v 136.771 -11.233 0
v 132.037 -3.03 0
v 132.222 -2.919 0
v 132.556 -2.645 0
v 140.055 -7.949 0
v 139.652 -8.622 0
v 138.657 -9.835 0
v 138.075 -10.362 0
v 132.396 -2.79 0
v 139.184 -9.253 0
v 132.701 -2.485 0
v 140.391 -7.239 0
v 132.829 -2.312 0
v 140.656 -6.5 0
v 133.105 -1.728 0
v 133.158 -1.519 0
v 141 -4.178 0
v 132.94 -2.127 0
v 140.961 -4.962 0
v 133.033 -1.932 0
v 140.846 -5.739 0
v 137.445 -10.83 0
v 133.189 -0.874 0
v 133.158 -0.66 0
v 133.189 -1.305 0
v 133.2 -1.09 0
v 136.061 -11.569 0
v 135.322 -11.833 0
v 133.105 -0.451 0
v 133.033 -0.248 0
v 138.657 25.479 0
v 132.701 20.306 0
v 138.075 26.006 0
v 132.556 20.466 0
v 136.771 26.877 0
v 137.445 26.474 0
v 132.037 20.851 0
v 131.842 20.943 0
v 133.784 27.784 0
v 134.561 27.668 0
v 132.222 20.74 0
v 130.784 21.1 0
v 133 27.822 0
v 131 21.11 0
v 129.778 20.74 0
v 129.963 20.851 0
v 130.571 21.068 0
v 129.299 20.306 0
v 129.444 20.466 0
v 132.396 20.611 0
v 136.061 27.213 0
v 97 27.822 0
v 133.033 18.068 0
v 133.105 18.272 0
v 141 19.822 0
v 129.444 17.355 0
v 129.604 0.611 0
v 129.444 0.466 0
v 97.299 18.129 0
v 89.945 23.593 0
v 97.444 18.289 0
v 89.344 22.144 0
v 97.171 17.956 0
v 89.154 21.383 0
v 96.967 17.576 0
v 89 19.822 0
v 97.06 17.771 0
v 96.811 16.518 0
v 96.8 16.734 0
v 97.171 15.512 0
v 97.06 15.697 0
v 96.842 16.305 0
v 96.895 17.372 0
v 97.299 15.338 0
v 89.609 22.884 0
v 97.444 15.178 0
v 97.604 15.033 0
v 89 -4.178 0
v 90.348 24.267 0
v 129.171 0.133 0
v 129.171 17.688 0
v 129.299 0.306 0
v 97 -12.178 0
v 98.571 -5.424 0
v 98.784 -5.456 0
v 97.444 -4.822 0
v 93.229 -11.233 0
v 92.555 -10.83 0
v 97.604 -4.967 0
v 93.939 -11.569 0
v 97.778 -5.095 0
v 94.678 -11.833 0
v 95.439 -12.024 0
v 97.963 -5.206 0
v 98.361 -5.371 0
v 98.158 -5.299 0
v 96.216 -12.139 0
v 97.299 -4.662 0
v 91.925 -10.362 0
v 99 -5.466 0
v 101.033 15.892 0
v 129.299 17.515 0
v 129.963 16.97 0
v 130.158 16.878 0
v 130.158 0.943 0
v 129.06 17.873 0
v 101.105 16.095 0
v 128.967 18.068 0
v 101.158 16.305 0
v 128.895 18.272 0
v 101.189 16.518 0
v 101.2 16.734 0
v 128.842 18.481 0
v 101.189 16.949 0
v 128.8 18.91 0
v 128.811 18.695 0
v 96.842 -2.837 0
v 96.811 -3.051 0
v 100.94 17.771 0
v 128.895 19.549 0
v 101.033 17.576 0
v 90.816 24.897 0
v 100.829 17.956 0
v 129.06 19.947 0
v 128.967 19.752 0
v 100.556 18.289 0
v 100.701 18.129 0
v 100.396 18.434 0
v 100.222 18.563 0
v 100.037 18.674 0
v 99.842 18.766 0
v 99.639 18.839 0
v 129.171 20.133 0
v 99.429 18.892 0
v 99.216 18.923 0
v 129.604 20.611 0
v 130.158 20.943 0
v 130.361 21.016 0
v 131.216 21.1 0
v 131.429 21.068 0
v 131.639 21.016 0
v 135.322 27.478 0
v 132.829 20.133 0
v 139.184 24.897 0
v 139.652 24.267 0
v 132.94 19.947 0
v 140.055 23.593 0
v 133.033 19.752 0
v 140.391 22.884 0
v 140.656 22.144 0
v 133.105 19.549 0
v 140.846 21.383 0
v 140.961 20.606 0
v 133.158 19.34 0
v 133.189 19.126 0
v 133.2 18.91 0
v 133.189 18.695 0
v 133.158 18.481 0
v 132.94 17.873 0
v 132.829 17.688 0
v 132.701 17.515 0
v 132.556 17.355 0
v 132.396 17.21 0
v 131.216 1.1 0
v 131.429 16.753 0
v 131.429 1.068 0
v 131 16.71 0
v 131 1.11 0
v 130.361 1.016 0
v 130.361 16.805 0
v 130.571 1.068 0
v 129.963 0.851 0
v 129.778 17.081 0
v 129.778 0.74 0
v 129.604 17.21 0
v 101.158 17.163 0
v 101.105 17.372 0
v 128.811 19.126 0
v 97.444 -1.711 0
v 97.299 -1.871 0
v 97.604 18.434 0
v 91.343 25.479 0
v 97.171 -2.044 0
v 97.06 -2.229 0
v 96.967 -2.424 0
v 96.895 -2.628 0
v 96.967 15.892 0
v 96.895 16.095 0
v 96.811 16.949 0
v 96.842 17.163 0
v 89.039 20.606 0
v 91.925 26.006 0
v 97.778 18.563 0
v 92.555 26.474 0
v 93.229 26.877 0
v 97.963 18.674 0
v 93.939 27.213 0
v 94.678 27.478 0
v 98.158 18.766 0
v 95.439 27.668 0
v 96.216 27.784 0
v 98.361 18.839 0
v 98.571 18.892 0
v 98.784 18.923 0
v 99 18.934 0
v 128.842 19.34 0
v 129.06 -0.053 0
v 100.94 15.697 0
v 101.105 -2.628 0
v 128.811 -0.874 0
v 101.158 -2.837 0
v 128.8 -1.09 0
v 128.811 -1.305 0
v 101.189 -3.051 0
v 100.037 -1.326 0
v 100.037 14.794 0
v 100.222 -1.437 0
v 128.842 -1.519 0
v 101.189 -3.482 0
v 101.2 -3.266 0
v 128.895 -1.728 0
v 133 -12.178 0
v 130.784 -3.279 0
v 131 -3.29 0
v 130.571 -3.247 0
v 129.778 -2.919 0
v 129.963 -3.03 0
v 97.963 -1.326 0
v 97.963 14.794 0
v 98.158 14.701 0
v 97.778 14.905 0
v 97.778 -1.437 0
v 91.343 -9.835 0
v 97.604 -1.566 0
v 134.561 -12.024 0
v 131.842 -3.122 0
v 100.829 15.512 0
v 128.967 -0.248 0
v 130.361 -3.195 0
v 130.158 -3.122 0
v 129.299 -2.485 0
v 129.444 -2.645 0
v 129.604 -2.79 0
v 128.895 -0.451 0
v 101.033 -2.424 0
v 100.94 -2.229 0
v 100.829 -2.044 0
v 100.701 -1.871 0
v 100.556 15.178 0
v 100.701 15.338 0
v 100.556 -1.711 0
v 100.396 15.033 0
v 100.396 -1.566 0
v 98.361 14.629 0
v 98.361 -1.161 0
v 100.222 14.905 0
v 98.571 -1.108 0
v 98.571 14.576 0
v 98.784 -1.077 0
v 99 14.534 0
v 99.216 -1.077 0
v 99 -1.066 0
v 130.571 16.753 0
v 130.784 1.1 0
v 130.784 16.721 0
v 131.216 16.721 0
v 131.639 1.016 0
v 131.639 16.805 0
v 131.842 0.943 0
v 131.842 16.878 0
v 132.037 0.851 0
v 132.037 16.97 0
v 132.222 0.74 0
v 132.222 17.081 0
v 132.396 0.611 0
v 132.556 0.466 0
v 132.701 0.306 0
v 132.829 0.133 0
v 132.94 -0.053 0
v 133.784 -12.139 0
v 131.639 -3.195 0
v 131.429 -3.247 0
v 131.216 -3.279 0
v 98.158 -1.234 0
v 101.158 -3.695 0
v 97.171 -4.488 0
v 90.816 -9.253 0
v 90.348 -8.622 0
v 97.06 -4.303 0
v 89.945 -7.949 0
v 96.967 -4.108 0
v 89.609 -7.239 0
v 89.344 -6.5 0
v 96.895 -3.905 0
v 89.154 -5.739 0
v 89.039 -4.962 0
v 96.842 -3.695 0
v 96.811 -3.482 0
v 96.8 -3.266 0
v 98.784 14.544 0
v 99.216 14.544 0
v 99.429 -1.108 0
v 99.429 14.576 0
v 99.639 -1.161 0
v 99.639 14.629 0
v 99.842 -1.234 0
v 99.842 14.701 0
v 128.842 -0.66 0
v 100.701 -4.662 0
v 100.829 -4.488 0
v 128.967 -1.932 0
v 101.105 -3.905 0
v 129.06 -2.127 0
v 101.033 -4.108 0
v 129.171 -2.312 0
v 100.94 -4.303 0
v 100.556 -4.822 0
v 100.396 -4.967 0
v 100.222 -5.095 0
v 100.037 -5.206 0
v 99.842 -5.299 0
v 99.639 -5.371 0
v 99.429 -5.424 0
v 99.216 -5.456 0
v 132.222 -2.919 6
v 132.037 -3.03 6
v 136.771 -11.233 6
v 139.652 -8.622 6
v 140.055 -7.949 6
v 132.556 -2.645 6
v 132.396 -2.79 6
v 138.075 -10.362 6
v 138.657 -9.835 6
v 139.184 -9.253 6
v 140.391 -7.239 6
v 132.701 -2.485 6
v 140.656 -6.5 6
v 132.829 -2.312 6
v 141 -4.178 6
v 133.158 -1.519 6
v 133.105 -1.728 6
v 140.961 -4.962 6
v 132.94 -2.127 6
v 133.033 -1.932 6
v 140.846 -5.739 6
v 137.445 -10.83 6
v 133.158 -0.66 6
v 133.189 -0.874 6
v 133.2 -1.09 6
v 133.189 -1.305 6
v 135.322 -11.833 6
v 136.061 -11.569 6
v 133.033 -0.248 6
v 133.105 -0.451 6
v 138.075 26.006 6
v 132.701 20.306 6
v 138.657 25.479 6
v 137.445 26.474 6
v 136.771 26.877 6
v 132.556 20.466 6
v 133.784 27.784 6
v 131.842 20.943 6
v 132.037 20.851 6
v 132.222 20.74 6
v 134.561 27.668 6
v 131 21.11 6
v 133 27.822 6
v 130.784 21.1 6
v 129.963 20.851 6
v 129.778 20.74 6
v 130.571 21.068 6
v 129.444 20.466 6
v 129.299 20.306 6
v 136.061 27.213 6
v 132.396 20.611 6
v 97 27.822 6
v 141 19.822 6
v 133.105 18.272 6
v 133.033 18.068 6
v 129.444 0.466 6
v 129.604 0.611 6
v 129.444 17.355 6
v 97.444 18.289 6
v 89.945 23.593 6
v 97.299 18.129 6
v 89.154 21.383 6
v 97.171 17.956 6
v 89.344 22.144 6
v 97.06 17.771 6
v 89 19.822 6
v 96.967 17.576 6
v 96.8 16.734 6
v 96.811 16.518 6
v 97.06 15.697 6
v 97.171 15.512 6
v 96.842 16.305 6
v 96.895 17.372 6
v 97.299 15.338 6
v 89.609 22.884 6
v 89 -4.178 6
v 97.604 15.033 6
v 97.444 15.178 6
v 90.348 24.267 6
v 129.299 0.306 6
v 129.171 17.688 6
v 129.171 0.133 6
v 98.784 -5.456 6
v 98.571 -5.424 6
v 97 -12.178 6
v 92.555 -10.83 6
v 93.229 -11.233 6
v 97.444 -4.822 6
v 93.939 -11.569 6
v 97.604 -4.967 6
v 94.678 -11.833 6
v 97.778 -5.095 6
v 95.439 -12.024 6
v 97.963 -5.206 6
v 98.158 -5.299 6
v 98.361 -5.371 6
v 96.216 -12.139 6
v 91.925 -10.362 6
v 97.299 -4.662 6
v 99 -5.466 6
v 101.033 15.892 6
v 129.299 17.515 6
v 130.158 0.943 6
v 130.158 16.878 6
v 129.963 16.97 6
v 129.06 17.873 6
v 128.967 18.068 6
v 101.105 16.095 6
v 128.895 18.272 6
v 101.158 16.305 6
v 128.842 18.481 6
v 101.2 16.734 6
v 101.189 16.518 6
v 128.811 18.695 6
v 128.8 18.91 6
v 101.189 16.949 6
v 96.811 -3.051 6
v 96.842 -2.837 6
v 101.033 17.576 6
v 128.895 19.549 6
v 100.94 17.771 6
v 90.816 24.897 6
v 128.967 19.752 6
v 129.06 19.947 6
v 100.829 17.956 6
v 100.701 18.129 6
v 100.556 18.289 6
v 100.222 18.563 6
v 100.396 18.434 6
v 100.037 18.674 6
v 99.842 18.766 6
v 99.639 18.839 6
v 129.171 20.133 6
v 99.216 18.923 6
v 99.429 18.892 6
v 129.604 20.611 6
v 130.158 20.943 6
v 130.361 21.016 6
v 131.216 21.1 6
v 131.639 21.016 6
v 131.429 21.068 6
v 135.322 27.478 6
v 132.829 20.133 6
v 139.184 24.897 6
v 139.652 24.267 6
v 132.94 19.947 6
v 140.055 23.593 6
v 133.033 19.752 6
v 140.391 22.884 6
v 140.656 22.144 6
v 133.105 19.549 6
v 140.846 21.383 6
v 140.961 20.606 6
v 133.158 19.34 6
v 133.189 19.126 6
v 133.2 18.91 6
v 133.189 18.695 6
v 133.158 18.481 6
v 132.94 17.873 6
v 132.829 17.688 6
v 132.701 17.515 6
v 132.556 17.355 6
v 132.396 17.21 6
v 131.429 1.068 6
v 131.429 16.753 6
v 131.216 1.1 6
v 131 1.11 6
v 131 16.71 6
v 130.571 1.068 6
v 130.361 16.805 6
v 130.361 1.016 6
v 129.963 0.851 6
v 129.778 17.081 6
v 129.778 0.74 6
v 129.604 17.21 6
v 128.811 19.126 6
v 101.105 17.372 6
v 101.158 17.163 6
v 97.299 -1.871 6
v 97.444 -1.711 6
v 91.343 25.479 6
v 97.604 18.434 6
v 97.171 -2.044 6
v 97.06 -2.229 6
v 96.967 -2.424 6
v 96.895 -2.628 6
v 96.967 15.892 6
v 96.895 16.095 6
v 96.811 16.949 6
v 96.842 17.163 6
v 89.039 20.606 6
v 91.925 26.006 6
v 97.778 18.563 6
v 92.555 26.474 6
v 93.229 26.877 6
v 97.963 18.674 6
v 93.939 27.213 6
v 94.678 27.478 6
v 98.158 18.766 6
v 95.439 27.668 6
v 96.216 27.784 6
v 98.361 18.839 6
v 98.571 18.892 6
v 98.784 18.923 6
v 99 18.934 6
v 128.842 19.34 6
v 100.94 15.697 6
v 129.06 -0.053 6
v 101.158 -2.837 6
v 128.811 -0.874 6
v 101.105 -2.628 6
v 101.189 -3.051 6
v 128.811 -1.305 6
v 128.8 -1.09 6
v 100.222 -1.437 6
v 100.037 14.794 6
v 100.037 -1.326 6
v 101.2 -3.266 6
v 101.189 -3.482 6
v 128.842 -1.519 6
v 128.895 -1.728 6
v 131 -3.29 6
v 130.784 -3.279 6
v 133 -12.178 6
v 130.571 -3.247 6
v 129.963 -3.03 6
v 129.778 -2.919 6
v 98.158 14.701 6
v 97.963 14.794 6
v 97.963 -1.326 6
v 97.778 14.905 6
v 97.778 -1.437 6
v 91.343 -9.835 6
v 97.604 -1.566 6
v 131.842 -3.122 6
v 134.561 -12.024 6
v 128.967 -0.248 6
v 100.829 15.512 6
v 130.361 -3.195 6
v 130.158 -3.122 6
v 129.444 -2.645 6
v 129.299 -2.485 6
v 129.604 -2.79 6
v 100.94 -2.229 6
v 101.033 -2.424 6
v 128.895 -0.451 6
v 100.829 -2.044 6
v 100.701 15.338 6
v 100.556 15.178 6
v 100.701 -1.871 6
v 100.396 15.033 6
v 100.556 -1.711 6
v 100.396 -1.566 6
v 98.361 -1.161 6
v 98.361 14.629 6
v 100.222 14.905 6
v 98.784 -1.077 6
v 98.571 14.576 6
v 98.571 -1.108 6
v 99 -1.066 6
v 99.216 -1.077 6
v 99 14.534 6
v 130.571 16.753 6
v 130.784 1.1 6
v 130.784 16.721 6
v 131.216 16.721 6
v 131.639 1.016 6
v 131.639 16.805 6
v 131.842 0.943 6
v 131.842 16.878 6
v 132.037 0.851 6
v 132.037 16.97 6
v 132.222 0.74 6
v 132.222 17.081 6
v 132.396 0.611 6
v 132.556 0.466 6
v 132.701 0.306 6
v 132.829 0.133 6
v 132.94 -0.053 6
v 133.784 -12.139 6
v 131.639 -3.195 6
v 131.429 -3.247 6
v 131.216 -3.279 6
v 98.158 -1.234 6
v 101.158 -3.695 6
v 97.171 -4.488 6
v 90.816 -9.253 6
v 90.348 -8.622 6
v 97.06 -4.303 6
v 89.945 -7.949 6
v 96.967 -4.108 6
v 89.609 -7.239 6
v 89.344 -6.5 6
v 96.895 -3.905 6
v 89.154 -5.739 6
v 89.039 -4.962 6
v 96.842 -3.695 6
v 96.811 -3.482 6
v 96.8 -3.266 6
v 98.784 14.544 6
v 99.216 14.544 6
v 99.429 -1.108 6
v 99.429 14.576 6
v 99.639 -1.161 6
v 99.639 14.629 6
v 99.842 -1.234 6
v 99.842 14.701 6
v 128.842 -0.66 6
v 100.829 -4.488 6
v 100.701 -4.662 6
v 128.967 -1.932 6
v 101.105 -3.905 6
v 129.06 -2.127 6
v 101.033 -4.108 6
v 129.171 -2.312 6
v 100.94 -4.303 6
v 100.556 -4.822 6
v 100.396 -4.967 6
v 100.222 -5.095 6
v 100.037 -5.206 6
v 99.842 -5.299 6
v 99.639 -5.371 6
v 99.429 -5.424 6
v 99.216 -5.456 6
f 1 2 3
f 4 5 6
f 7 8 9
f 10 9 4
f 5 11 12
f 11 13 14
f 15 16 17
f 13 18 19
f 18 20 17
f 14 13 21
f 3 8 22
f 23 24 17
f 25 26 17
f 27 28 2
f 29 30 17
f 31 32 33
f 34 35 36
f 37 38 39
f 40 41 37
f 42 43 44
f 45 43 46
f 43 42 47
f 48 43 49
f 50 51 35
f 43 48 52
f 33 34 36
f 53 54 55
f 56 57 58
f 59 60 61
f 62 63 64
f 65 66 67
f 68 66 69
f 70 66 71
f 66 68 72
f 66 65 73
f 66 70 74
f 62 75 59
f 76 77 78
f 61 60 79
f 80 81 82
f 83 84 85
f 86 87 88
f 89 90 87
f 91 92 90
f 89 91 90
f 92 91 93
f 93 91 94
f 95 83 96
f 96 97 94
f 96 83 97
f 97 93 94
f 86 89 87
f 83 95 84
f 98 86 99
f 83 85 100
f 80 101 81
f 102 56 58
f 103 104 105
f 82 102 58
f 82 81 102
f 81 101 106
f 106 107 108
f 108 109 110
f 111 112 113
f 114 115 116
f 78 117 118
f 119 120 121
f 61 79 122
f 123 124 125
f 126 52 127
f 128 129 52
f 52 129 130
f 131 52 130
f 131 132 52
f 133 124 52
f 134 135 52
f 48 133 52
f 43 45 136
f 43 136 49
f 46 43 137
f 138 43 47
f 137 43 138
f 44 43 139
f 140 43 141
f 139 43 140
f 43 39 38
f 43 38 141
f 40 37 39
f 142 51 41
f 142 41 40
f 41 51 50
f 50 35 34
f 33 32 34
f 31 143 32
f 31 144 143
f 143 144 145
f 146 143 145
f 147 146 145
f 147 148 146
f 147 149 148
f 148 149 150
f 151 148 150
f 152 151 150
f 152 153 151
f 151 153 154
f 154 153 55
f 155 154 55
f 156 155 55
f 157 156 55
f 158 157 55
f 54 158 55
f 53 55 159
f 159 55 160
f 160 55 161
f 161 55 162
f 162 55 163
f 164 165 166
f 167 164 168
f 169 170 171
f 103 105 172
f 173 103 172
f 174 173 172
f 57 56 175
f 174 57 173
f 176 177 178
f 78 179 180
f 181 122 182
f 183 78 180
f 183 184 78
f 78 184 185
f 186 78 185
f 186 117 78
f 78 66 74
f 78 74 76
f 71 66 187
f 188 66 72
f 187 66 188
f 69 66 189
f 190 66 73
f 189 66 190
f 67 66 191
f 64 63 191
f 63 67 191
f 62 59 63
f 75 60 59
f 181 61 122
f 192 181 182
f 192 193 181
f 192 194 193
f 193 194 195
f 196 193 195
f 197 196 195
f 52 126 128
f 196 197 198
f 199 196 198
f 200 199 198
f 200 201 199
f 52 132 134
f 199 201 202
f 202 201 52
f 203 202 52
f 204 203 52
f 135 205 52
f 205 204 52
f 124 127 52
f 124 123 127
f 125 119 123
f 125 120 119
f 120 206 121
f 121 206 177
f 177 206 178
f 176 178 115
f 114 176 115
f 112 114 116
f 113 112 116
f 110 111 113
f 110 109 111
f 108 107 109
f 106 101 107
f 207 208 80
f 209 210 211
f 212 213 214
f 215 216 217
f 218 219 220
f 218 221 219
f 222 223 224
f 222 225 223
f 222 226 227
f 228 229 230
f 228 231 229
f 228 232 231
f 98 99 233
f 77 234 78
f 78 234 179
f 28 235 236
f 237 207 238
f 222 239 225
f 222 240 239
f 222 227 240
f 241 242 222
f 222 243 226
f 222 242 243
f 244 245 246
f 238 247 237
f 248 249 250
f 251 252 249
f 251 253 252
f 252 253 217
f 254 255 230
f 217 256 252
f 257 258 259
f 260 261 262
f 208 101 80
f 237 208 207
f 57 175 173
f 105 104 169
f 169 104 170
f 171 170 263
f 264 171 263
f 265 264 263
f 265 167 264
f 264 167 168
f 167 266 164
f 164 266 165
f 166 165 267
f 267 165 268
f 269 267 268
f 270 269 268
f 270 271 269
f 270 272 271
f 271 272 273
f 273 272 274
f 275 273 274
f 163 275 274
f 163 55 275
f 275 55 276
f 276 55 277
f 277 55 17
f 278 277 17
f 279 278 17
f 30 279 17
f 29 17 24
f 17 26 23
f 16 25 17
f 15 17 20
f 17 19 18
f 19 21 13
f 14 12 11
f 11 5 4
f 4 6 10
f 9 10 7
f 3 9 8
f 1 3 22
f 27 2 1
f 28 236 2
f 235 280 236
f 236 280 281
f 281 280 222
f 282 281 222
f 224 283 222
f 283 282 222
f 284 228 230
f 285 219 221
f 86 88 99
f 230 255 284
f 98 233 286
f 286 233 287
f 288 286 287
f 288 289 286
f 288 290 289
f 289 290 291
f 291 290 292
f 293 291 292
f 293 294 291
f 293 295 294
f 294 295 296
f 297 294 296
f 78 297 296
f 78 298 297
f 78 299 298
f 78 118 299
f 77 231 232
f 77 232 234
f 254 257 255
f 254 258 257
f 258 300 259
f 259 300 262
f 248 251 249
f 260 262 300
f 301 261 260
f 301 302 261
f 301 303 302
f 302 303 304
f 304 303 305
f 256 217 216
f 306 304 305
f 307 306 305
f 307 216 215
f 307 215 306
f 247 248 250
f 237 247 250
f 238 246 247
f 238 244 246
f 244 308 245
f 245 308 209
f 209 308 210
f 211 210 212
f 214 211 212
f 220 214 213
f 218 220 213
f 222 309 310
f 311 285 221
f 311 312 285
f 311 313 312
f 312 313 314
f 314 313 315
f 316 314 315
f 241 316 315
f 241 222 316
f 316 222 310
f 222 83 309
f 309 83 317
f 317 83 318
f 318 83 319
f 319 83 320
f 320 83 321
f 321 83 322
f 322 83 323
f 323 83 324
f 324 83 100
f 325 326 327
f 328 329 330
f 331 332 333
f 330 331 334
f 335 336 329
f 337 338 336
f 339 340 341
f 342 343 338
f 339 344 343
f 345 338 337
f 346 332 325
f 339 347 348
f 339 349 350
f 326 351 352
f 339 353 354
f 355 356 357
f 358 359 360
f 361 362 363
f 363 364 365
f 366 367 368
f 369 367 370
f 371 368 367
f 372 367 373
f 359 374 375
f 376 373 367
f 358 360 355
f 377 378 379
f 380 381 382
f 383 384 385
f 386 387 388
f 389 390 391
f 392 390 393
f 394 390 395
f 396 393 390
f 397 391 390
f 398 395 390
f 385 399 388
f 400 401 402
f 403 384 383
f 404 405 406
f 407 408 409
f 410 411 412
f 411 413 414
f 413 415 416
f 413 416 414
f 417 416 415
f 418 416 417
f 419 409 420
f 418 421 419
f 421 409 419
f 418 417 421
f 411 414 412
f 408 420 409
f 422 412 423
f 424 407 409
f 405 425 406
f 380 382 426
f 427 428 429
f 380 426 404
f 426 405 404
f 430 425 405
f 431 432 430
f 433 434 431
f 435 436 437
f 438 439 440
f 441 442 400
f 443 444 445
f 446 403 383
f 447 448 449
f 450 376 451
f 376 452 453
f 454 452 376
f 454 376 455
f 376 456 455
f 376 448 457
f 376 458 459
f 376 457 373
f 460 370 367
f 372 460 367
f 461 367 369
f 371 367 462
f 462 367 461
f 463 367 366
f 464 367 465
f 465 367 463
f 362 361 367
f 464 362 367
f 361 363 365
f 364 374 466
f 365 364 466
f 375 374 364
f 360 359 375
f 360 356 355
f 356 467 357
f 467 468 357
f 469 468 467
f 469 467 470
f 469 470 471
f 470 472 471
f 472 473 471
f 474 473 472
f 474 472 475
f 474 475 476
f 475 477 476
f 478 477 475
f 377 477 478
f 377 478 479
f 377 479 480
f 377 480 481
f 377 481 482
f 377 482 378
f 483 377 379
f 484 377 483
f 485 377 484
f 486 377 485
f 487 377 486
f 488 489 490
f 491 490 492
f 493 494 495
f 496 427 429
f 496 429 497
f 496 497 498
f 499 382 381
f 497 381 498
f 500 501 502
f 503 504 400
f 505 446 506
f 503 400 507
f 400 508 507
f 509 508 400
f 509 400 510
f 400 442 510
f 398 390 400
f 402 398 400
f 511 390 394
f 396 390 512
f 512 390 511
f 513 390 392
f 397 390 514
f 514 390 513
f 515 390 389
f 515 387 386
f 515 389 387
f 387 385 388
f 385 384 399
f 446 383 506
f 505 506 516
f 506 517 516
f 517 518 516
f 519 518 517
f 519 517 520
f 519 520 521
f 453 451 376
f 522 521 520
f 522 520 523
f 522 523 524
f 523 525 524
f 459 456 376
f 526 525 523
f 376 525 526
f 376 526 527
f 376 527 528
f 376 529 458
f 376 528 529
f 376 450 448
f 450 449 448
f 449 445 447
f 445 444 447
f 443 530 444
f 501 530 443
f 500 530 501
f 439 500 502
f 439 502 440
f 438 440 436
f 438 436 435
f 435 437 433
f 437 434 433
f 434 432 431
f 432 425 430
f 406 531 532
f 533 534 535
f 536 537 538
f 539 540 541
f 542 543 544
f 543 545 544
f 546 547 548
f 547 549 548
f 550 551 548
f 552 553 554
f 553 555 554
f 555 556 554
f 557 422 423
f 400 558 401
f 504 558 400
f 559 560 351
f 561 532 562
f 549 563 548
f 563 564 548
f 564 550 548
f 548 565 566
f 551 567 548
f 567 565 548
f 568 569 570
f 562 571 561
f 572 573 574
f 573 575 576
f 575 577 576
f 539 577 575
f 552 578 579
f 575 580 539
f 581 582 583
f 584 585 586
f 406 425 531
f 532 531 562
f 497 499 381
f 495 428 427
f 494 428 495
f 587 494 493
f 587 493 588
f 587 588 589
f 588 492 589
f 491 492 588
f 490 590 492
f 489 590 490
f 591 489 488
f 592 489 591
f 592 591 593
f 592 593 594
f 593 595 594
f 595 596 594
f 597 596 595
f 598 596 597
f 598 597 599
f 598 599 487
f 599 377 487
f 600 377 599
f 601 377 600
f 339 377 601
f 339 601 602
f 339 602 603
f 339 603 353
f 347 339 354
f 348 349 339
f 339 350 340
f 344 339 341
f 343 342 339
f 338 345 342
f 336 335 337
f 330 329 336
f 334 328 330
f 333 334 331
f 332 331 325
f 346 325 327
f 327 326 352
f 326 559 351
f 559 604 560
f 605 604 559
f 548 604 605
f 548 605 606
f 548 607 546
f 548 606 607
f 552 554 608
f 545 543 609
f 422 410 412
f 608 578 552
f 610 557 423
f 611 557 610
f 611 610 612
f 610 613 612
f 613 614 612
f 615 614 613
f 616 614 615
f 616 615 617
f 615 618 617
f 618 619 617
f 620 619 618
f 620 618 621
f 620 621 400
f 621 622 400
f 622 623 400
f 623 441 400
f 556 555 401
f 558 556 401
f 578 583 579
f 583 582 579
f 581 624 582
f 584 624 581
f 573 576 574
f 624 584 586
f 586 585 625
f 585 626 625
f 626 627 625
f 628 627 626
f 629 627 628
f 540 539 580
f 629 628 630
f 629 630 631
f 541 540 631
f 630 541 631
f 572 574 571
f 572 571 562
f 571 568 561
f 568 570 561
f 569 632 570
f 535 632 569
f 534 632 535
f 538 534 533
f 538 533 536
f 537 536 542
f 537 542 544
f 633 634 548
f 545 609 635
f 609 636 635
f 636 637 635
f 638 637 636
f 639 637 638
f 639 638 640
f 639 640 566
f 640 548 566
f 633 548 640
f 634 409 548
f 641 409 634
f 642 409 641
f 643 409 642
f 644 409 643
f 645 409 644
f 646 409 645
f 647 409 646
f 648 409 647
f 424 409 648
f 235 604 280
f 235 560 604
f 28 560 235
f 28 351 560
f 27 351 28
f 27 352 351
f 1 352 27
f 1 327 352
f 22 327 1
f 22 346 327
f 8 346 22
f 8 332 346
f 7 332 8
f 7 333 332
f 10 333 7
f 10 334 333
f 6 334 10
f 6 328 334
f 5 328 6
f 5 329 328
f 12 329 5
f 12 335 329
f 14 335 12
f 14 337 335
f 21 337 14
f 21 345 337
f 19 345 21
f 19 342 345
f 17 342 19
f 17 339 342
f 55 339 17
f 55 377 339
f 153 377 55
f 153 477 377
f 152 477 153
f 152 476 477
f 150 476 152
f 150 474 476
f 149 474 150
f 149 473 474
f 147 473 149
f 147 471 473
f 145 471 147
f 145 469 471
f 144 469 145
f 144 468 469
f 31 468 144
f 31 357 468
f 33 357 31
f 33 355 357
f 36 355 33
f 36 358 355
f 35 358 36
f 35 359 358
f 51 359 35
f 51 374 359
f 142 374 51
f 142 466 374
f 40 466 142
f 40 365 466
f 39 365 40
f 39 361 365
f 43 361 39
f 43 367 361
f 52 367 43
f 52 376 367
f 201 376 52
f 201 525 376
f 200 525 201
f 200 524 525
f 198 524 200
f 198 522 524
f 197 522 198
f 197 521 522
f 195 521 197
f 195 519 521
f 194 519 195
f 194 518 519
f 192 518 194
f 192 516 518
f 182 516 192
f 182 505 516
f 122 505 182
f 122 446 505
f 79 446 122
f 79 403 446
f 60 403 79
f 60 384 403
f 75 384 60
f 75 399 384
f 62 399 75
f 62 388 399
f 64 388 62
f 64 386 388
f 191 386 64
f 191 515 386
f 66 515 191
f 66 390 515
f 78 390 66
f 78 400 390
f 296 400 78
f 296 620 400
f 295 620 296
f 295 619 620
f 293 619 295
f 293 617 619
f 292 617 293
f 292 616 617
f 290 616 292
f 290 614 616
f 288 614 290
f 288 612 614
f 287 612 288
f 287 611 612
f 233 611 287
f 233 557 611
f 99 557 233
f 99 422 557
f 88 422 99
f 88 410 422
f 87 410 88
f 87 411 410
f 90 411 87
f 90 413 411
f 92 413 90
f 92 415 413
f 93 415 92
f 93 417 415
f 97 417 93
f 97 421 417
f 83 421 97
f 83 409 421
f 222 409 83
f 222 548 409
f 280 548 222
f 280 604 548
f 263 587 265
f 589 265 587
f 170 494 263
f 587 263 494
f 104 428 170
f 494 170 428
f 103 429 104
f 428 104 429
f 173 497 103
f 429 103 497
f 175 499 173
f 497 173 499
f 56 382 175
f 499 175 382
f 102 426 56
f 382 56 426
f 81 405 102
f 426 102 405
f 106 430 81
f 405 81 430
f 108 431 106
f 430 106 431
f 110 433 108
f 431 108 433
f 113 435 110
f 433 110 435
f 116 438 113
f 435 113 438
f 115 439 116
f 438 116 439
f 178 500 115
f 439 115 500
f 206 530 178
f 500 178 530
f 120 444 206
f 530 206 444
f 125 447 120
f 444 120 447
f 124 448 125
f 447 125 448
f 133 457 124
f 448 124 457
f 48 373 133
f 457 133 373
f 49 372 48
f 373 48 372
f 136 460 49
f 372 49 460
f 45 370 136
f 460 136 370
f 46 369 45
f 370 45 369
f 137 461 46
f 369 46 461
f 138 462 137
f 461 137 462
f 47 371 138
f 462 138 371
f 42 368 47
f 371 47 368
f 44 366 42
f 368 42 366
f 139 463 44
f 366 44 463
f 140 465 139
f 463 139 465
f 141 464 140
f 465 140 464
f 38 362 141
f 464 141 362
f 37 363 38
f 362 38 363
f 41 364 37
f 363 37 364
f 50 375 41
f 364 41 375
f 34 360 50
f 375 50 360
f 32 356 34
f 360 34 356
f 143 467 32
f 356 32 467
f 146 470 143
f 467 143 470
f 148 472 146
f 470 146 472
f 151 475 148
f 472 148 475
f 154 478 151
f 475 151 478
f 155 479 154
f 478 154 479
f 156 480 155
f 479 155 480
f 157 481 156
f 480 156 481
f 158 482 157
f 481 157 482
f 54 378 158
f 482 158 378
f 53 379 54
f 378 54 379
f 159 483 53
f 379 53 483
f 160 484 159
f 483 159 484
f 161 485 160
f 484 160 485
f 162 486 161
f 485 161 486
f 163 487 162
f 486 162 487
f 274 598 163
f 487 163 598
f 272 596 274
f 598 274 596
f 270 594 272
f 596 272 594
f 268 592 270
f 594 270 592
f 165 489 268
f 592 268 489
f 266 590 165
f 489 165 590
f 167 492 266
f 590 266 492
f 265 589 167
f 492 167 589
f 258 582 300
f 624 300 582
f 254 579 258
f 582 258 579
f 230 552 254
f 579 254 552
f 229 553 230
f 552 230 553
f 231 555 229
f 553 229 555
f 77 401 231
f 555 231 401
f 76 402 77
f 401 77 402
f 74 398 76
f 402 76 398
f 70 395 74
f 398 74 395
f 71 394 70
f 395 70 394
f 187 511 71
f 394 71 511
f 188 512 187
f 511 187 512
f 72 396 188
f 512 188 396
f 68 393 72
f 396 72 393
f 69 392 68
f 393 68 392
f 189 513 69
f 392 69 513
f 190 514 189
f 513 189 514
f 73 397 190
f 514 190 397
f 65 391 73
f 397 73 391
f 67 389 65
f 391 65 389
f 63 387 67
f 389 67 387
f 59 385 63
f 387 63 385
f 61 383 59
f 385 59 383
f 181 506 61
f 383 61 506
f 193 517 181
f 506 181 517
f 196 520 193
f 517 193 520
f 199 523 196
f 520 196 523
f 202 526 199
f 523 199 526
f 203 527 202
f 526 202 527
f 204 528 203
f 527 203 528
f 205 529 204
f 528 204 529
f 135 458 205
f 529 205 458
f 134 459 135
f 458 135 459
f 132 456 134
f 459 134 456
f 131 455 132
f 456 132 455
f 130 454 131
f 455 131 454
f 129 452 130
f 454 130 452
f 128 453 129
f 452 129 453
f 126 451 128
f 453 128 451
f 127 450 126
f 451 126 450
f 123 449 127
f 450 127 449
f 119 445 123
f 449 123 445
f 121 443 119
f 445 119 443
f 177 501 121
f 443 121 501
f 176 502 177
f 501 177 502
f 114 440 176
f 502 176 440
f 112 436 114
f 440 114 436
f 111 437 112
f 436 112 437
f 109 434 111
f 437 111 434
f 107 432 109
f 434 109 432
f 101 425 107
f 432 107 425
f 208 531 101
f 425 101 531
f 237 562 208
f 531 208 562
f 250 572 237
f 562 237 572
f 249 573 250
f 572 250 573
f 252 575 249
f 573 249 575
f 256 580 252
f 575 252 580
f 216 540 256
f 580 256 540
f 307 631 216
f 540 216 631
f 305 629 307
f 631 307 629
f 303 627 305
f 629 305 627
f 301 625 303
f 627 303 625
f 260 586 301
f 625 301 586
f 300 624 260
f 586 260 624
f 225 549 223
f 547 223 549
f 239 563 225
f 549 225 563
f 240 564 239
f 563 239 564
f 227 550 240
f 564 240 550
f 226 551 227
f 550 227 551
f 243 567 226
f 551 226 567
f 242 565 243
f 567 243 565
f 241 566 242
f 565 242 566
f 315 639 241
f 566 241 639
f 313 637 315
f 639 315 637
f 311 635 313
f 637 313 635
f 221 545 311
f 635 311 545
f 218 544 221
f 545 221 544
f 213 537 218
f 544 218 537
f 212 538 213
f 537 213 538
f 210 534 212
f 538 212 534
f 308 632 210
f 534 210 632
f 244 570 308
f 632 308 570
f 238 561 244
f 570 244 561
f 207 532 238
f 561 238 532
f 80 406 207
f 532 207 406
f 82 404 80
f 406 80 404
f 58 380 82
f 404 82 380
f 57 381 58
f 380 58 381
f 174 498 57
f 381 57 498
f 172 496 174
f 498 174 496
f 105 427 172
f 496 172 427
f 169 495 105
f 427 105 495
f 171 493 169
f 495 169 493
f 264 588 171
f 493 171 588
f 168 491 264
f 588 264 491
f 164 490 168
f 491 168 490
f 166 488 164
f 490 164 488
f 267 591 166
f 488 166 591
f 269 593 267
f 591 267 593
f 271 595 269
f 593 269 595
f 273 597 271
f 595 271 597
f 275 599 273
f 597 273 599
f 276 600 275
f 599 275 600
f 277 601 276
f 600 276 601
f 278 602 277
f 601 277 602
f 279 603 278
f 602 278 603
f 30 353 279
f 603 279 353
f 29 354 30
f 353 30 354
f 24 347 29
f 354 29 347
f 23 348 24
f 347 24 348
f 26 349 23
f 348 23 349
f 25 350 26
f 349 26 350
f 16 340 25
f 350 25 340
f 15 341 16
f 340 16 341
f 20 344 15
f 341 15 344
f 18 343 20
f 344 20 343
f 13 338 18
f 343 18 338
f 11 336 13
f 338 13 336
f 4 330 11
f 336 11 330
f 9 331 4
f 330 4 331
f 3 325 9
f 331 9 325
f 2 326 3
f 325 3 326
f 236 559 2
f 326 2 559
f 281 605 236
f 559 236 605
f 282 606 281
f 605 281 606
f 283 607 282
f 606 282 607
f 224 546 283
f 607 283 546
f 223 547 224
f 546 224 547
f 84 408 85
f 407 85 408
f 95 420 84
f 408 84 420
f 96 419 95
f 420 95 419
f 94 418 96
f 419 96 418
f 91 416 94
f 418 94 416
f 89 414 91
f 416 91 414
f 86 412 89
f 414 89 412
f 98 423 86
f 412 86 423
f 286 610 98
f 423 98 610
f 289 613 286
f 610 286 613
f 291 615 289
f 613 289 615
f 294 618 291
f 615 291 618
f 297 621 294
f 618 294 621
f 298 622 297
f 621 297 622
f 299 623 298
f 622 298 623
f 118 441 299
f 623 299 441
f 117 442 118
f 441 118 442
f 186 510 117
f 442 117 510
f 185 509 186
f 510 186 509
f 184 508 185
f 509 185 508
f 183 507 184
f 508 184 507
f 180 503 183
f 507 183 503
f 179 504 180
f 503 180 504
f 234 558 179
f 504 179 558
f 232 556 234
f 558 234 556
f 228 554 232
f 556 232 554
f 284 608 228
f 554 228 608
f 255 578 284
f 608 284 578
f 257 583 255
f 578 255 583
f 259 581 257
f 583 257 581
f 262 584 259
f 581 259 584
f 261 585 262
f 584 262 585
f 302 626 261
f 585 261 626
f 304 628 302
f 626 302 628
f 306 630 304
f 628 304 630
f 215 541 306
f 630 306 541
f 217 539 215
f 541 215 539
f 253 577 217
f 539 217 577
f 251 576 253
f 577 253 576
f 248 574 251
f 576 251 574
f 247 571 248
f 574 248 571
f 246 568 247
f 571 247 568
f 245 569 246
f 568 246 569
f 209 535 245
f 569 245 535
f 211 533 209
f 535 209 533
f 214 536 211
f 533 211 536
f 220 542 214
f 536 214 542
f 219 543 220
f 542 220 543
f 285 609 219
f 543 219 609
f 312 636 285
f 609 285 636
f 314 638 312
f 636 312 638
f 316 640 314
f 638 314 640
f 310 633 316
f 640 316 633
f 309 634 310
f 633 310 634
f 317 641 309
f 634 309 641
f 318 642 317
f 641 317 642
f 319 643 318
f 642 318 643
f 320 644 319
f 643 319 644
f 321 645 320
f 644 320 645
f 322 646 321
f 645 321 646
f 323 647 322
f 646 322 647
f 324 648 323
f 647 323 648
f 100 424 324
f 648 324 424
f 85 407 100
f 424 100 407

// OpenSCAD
// file: ../lib/vitamins.scad
// 구매품 목업 (vitamins) — 조립 간섭 확인용 (출력 부품 아님)
// 모든 모듈은 % 배경 처리로 호출부에서 사용 시 STL export에서 제외된다.
// 좌표 규약: 액추에이터는 기어박스 플랜지면 z=0, 출력축 +Z, 몸체 −Z.
include <../config/parameters.scad>

// SF24 스테퍼 모터 (42각). len = 몸체 길이, 플랜지면 z=0, 몸체 −Z
module motor_sf24(len) {
    translate([0, 0, -len])
        linear_extrude(len)
            offset(r = 3) square(motor_frame - 6, center = true);
}

// MG17 유성 기어박스. len = 몸체 길이, 출력 플랜지면 z=0, 출력축 +Z, 몸체 −Z
module gearbox_mg17(len) {
    union() {
        translate([0, 0, -len]) cylinder(d = gbx_frame, h = len);
        cylinder(d = gbx_out_shaft_d, h = gbx_out_shaft_len);
        cylinder(d = nema17_pilot_d, h = 2); // 출력측 파일럿 보스
    }
}

// 모터+기어박스 스택. 출력 플랜지면 z=0, 출력축 +Z
module actuator(motor_len, gbx_len) {
    union() {
        gearbox_mg17(gbx_len);
        translate([0, 0, -gbx_len]) motor_sf24(motor_len);
    }
}

// 관절별 액추에이터 프리셋
module actuator_J1() { actuator(motor_len_SF2424, gbx_len_20to1); }
module actuator_J2() { actuator(motor_len_SF2424, gbx_len_20to1); }
module actuator_J3() { actuator(motor_len_SF2423, gbx_len_20to1); }
module actuator_J4() { actuator(motor_len_SF2422, gbx_len_5to1); }

// 베어링 (zz 실드 단순 링)
module bearing(brg) {
    difference() {
        cylinder(d = brg[1], h = brg[2]);
        translate([0, 0, -0.1]) cylinder(d = brg[0], h = brg[2] + 0.2);
    }
}

// 스트리퍼(숄더) 볼트 — **피벗 샤프트 역할** (CON-001):
// SHCS형 머리 + 연삭 숄더(⌀d × l, 베어링 내경 활주면) + 감경 나사부
module shoulder_bolt(d, l) {
    union() {
        cylinder(d = d, h = l);                              // 숄더 (샤프트면)
        translate([0, 0, -d]) cylinder(d = d * 1.6, h = d);  // 머리
        translate([0, 0, l]) cylinder(d = d * 0.72, h = d);  // 나사부 (M(d-2)급)
    }
}

// 머신 볼트 (SHCS) — **고정 체결 전용** (샤프트 역할 아님)
module machine_bolt(d, l) {
    union() {
        translate([0, 0, -d]) cylinder(d = d * 1.7, h = d);  // 캡 머리
        cylinder(d = d, h = l);                              // 전산 생크
    }
}

// 육각 스탠드오프 (hex standoff, 암-암) — 플레이트 간격 결정 구조재
module hex_standoff(af, l) {
    difference() {
        cylinder(d = af / cos(30), h = l, $fn = 6);
        translate([0, 0, -0.1]) cylinder(d = af * 0.45, h = l + 0.2);
    }
}

// 나일론 락 너트 (nylock) — 회전 관절 축단 풀림 방지 (일반 너트와 구분)
module lock_nut(af, t, bore) {
    difference() {
        union() {
            cylinder(d = af / cos(30), h = t, $fn = 6);
            translate([0, 0, t - 0.1]) cylinder(d = af * 0.92, h = t * 0.5);
        }
        translate([0, 0, -0.1]) cylinder(d = bore, h = 2 * t);
    }
}

// 평와셔 (washer) — CON-001: 피벗은 숄더 볼트 + 와셔
module washer(d_in, t = 1.2) {
    difference() {
        cylinder(d = d_in * 2.2, h = t);
        translate([0, 0, -0.1]) cylinder(d = d_in + 0.3, h = t + 0.2);
    }
}

// 육각 너트 — af = 평면폭(across flats), 보어 = 호칭경
module hex_nut(af, t, bore) {
    difference() {
        cylinder(d = af / cos(30), h = t, $fn = 6);
        translate([0, 0, -0.1]) cylinder(d = bore, h = t + 0.2);
    }
}

// 기계식 마이크로 리미트 스위치 (KW12형) — 몸체만, 레버 생략
module limit_switch() {
    translate([-ls_body[0] / 2, -ls_body[2] / 2, 0])
        cube([ls_body[0], ls_body[2], ls_body[1]]);
}
// file: ../lib/utils.scad
// 공통 모듈 (common modules) — 베어링 시트, 볼트 홀 등
include <../config/parameters.scad>

// 베어링 시트 (bearing seat): 압입 공차 적용 포켓
// brg = [내경, 외경, 폭] (예: BRG_608ZZ)
module bearing_seat(brg) {
    cylinder(d = brg[1] + bearing_press_fit, h = brg[2]);
}

// 베어링 시트 + 내륜 도피 홀 (관통)
// wall = 시트 아래 받침 두께
module bearing_pocket(brg, wall = 2) {
    union() {
        translate([0, 0, wall]) bearing_seat(brg);
        // 내륜 접촉 방지: 내경보다 크고 외경보다 작은 도피 홀
        cylinder(d = (brg[0] + brg[1]) / 2, h = wall + 0.1);
    }
}

// 관통 볼트 홀 (clearance hole)
module bolt_hole(d, h) {
    cylinder(d = d + bolt_hole_oversize, h = h);
}

// NEMA 17 모터 마운트 홀 패턴 (CON-004: SF24 = 42각 NEMA 17 호환)
// h = 판 두께
module nema17_mount(h) {
    union() {
        cylinder(d = nema17_pilot_d + clearance_fit, h = h);
        for (x = [-1, 1], y = [-1, 1])
            translate([x * nema17_hole_pitch / 2, y * nema17_hole_pitch / 2, 0])
                bolt_hole(nema17_bolt_d, h);
    }
}

// 숄더 볼트 피벗 홀 (CON-001)
// d = 숄더 직경 (shoulder_d_small | shoulder_d_large)
module pivot_hole(d, h) {
    cylinder(d = d + clearance_fit, h = h);
}

// 베어링 보스 (bearing boss): 출력물 허브에 베어링 내경 직접 안착 (CON-003)
// 내경 기준 압입 — bearing_press_fit(음수)만큼 키운다
module bearing_boss(brg, h) {
    cylinder(d = brg[0] - bearing_press_fit, h = h);
}

// 육각 너트 포켓 (nut pocket) — 차집합용. af = 평면폭(across flats)
module nut_pocket(af, t) {
    cylinder(d = (af + clearance_fit) / cos(30), h = t, $fn = 6);
}

// 리미트 스위치 장착 홀 쌍 (ELE-004) — 차집합용, X축 방향 피치
module ls_mount_holes(h) {
    for (x = [-1, 1])
        translate([x * ls_hole_pitch / 2, 0, 0])
            cylinder(d = ls_hole_d, h = h);
}

// 케이블 가이드 클립 (ELE-005) — 외면 부착형 C-클립, cable_d 다발 직경
module cable_clip(cable_d = 8, t = 4) {
    wall = 2.5;
    difference() {
        cylinder(d = cable_d + 2 * wall, h = t);
        translate([0, 0, -0.1]) cylinder(d = cable_d, h = t + 0.2);
        // 삽입 개구 (개구 폭 = 케이블 직경의 70%)
        translate([0, -cable_d * 0.35, -0.1])
            cube([cable_d, cable_d * 0.7, t + 0.2]);
    }
}

// 평행/구동 링크 바 (625ZZ 양단, MEC-002/MEC-001a)
// len = 피벗 간 거리. 보스 상면에서 베어링 압입, 하면 내륜 도피 홀.
module link_bar(len) {
    boss_t = BRG_625ZZ[2] + 4;
    difference() {
        union() {
            translate([0, -link_bar_w / 2, (boss_t - link_bar_t) / 2])
                cube([len, link_bar_w, link_bar_t]);
            for (x = [0, len])
                translate([x, 0, 0]) cylinder(d = link_boss_d, h = boss_t);
        }
        for (x = [0, len]) {
            translate([x, 0, boss_t - BRG_625ZZ[2]])
                bearing_seat([BRG_625ZZ[0], BRG_625ZZ[1], BRG_625ZZ[2] + 0.1]);
            translate([x, 0, -0.1])
                cylinder(d = (BRG_625ZZ[0] + BRG_625ZZ[1]) / 2, h = boss_t + 0.2);
        }
    }
}

// 지시선(leader) + 빌보드(billboard) 라벨 — 프리뷰용, $vpr 카메라 추종
// p = 앵커(부품 측), v = 지시선 벡터 (라벨은 p+v 위치)
// 주의: 상위 프레임이 회전된 경우 빌보드가 카메라를 향하지 않음 — 월드 프레임에서 호출할 것
module leader_label(p, v, txt, size = 3.2, col = "white") {
    color(col) {
        hull() {
            translate(p) sphere(d = 1.4, $fn = 12);
            translate(p + v) sphere(d = 1.4, $fn = 12);
        }
        translate(p + v) rotate($vpr) translate([2, -size / 2, 0])
            linear_extrude(0.6) text(txt, size = size);
    }
}

// 축 클램프 슬릿 + M3 핀치 볼트 (차집합용)
// bore_d = 클램프 보어, depth = 보어 깊이, body_d = 보스 외경
module shaft_clamp_cut(bore_d, depth, body_d) {
    union() {
        cylinder(d = bore_d + clearance_fit / 2, h = depth);
        // 슬릿
        translate([-1, 0, -0.1]) cube([2, body_d / 2 + 1, depth + 0.1]);
        // M3 핀치 볼트 (슬릿 직교) — 보어 반경과 보스 반경 사이
        translate([0, (bore_d / 2 + body_d / 2) / 2 + 1, depth / 2])
            rotate([0, 90, 0])
                translate([0, 0, -body_d / 2 - 1])
                    bolt_hole(3, body_d + 2);
    }
}
// file: upper_arm.scad
// 상완 (upper arm) — 순수 플레이트 아키텍처 (v0.13, MEC-001/004/006)
// =====================================================================
// 구성: 평판 측판 2장 (A/-Y, B/+Y, t7) + 표준 스페이서 튜브 ⌀10 ×6 (M4 관통)
//   — 일체 보스·웹·보·텅·리드 전부 폐기. 위에서 보면 막힘 없음(개방 프레임)
// 길이 365 > 빌드 대각 한계 → 각 측판을 x=ua_split_x에서 **맞대기 분할 +
//   스플라이스 더블러(평판, M4 ×4)** — 구 테논/소켓 tip 폐기
// 관절 (v0.13 반전): 팔꿈치 608ZZ는 **하완 플레이트에 압입** — 상완 측판은
//   ⌀8 숄더 볼트 클램프 홀만 (텅 삭제, MEC-004 분담 의도 유지)
// 제조: 전 피스 평판 — FDM 평면 출력 / CNC 2.5D (GEN-002)
// 인터페이스:
//   [B 외면] J2 액추에이터 NEMA17 (MEC-001b — 출력축은 어깨 plate_b 클램프로)
//   [A]      J2 아이들 ⌀8 홀 + 머리 카운터보어 / J3 NEMA17 (MEC-001c) /
//            J3 리미트 홀 / J2 베인(평면 외곽 범프)
//   [B]      J3 모터 몸체 통과 d44
// 프로파일: 러그 3점(후방/J2/팔꿈치) + 니(knee) 캡슐 체인 (꺾임 §3b),
//   x28~62 상단 트림 — 어깨 앵커 스윕(z<38, y30~37) 회피
include <../config/parameters.scad>
use <../lib/utils.scad>
use <../lib/vitamins.scad>

pa_in  = -arm_inner_w / 2;  pa_out = pa_in - arm_plate_t;
pb_in  =  arm_inner_w / 2;  pb_out = pb_in + arm_plate_t;
rear_lug_x = -rear_extension;
ua_knee_x = L1 * ua_bend_pos;
ua_knee_h = L1 * ua_bend_pos * (1 - ua_bend_pos) * tan(ua_bend_deg);
function ua_cz(x) = x < 0 ? 0
                  : x < ua_knee_x ? ua_knee_h * x / ua_knee_x
                  : ua_knee_h * (L1 - x) / (L1 - ua_knee_x);

// 두꺼운 육각 스탠드오프 M6 AF13 ×2 (v0.13 — 다수 튜브 대신 소수 후육).
// 나머지 구속: J2 관절(어깨 스택 클램프) + 팔꿈치 스택 + 스플라이스 더블러.
// 위치 제약: 후방 러그(r34) 내 + 전방은 x ≥ 90 (어깨 텅 스윕 반경 밖)·창 회피
ua_standoffs = [[-108, 0], [160, 9]];
rear_lug_R = arm_lug_r + 8;   // 후방 러그 r34 — J3 모터 사각 통과 홀(43.6²) 수용
// 스플라이스 더블러 볼트 [x, z] ×4 (분할선 ±16, 중심선 추종)
function ua_splice_pts() = [for (x = ua_splice, dz = [-10, 10])
                            [x, ua_cz(x) + dz]];

// 측판 외곽 2D: 러그-니 캡슐 체인 + 상단 트림 + (A측) 베인 범프
module ua_plate2d(vane = false) {
    difference() {
        union() {
            hull() {
                // 후방 러그 r34 — 하단: 평탄(-26) + 후방 45° 챔퍼.
                // J2 +45° 회전 시 45° 챔퍼는 수직이 되어 어깨 플랜지(z≤200)를
                // 기하학적으로 클리어 (t+h=-114 → z'=201.4, 그리드 검증 v0.14).
                // 사각 통과 홀 좌하 코너는 챔퍼에 개방 — 허용 (3변 구속 잔존)
                translate([rear_lug_x, 0]) intersection() {
                    circle(r = rear_lug_R);
                    polygon([[-8, -arm_lug_r], [40, -arm_lug_r], [40, 40],
                             [-40, 40], [-34, 0]]);
                }
                circle(r = arm_lug_r);
            }
            hull() {
                circle(r = arm_lug_r);
                translate([ua_knee_x, ua_knee_h]) circle(r = arm_lug_r - 4);
            }
            hull() {
                translate([ua_knee_x, ua_knee_h]) circle(r = arm_lug_r - 4);
                translate([L1, 0]) circle(r = arm_lug_r);
            }
            // J2 리미트 베인 (평면 외곽 범프, r 28~35 — 어깨 러그 r28 밖)
            if (vane) rotate(155) translate([31.5, 0]) square([7, 6], center = true);
        }
        // 상단 트림: x 20~62 z>15 — 어깨 앵커 암 스윕 존 회피.
        // (x 25~28의 러그→니 헐 에지도 J2 +40°에서 앵커 하면을 스침 — v0.14 확장)
        translate([20, 15]) square([42, 60]);
    }
}

// 공통 홀 2D: 스탠드오프 M6 + 스플라이스 M4 + 경량창
module ua_holes2d() {
    for (p = ua_standoffs) translate(p) circle(d = 6.6);
    for (p = ua_splice_pts()) translate(p) circle(d = 4.4);
    for (p = [[-40, 0, 16], [38, -6, 14]])              // 루트 존 경량창
        translate([p[0], p[1]]) circle(d = p[2]);
    for (x = [75, 160, 188])                            // 빔 존 경량창 (중심선 추종)
        translate([x, ua_cz(x)]) circle(d = 20);
}

// ── 측판 A (-Y): J2 아이들 + J3 NEMA ──
module ua_plate_a() {
    difference() {
        translate([0, pa_in, 0]) rotate([90, 0, 0]) linear_extrude(arm_plate_t)
            difference() {
                ua_plate2d(vane = true);
                ua_holes2d();
                circle(d = shoulder_d_large + clearance_fit);       // J2 아이들 ⌀8
                translate([L1, 0]) circle(d = shoulder_d_large + clearance_fit); // 팔꿈치 ⌀8
            }
        // J2 아이들 머리 카운터보어 (외면 플러시 — 구동 링크 평면 간섭 회피)
        translate([0, pa_out - 0.1, 0]) rotate([-90, 0, 0]) cylinder(d = 15, h = 4.1);
        // 팔꿈치 머리 카운터보어
        translate([L1, pa_out - 0.1, 0]) rotate([-90, 0, 0]) cylinder(d = 15, h = 4.1);
        // J3 NEMA17 (플랜지 내면 밀착, -Y측 M3 체결)
        translate([rear_lug_x, pa_out - 0.1, 0]) rotate([-90, 0, 0])
            nema17_mount(arm_plate_t + 0.2);
        // J3 리미트 스위치 홀 (크랭크 베인 감지)
        translate([rear_lug_x + 32, pa_out - 0.1, -14]) rotate([-90, 0, 0])
            ls_mount_holes(arm_plate_t + 0.2);
    }
}

// ── 측판 B (+Y): J2 NEMA + J3 통과 ──
module ua_plate_b() {
    difference() {
        translate([0, pb_out, 0]) rotate([90, 0, 0]) linear_extrude(arm_plate_t)
            difference() {
                ua_plate2d();
                ua_holes2d();
                // J3 모터 몸체 통과 — 42각 + 1.6 여유 **사각** 홀
                // (원형 d44는 모터 코너 대각 59.4가 침범 — 렌더 교차 검증 v0.14)
                translate([rear_lug_x, 0])
                    square(motor_frame + 1.6, center = true);
                translate([L1, 0]) circle(d = shoulder_d_large + clearance_fit);
            }
        // J2 NEMA17 (기어박스 플랜지 외면 안착)
        translate([0, pb_out + 0.1, 0]) rotate([90, 0, 0])
            nema17_mount(arm_plate_t + 0.2);
    }
}

// ── 스플라이스 더블러 (평판 52×40 t6, 내면측 — 양 측판 공용 ×2) ──
module ua_doubler() {
    linear_extrude(6) difference() {
        translate([ua_split_x, ua_cz(ua_split_x)])
            offset(r = 8) square([36, 24], center = true);
        for (p = ua_splice_pts()) translate(p) circle(d = 4.4);
    }
}

// section: "full" | "a_root"/"a_tip"/"b_root"/"b_tip" (분할 측판) | "doubler"
module upper_arm(section = "full") {
    if (section == "full") {
        ua_plate_a(); ua_plate_b();
        translate([0, pa_in + 6, 0]) rotate([90, 0, 0]) ua_doubler();
        translate([0, pb_in, 0]) rotate([90, 0, 0]) ua_doubler();
    }
    else if (section == "doubler") ua_doubler();
    else if (section == "a_root") ua_half(true) ua_plate_a();
    else if (section == "a_tip")  ua_half(false) ua_plate_a();
    else if (section == "b_root") ua_half(true) ua_plate_b();
    else if (section == "b_tip")  ua_half(false) ua_plate_b();
}

// 맞대기 분할 헬퍼: root = x ≤ ua_split_x (더블러가 이음)
module ua_half(root) {
    intersection() {
        children();
        translate([root ? ua_split_x - 500 : ua_split_x, -200, -200])
            cube([500, 400, 400]);
    }
}

// 비주얼 참조 (STL 제외)
%translate([0, pb_out, 0]) rotate([90, 0, 0]) actuator_J2();
%translate([rear_lug_x, pa_in, 0]) rotate([90, 0, 0]) actuator_J3();

upper_arm();
// file: ../config/parameters.scad
// cobot-lite 전역 파라미터 (global parameters)
// 모든 부품 치수는 이 파일에서만 정의한다 — 매직 넘버 하드코딩 금지 (MEC-008)

/* ===== 출력/렌더링 ===== */
$fn = 64;

/* ===== 공통 가공 여유 (파생 치수에서 참조 — 선행 정의 필수) ===== */
clearance_fit = 0.3;      // 회전/슬라이드 끼움 여유
bolt_hole_oversize = 0.4; // 관통 볼트 홀 여유

/* ===== 베어링 (bearing) — CON-002: 이 4종만 사용 =====
   [내경, 외경, 폭] mm */
BRG_608ZZ  = [8,  22, 7];   // 관절 피벗 (8mm 숄더 볼트)
BRG_625ZZ  = [5,  16, 5];   // 평행 링크 피벗 (5mm 숄더 볼트)
BRG_6805ZZ = [25, 37, 7];   // 손목 롤 축, 중구경 허브
BRG_6810ZZ = [50, 65, 7];   // 베이스 턴테이블 메인 베어링

// 베어링 압입 공차 (press-fit tolerance) — MFG-002
// 외경 기준 -0.1 ~ -0.2mm. 프린터별 보정은 이 변수 하나로 조정한다.
bearing_press_fit = -0.15;

/* ===== 숄더 볼트 (stripper/shoulder bolt) — CON-001 ===== */
shoulder_d_small = 5;   // 625ZZ 결합
shoulder_d_large = 8;   // 608ZZ 결합

/* ===== 링크 길이 — MEC-006 [TBD-4] =====
   리치 500mm 잠정. 비대칭 분할 (J2 자중 부담 보상, MEC-001a 분담 구조) */
L1 = 225;   // 상완 (upper arm): J2 축 → J3 축
L2 = 275;   // 하완 (forearm): J3 축 → 공구 플랜지

/* ===== 링크 꺾임 (팔레타이저식 구조 오프셋) =====
   관절 축 좌표는 불변(직선 L1/L2 기준) — 꺾임은 빔 형상만 변경.
   목적: ① 신장/접힘 한계 자세에서 빔-빔 간섭 여유 확보
        ② 구조 외곽을 축선 위로 올려 저자세 작업 시 팔꿈치 하부 돌출 감소
   니(knee) 수직 오프셋 h = L·pos·(1-pos)·tan(deg) */
ua_bend_deg = 12;     // 상완 꺾임각 (0 = 직선)
ua_bend_pos = 0.68;   // 꺾임 위치 (0~1, J2 기준) — 분할 조인트(95~131) 뒤
fa_bend_deg = 12;     // 하완 꺾임각
fa_bend_pos = 0.5;    // 꺾임 위치 (팔꿈치 기준)

/* ===== 가동 엔벨로프 (소프트 리미트 권고값 — docs/design-notes.md) =====
   접힘각 = J3 - J2 (월드 피치 차).
   -90° = 평행사변형 구동 전동각(transmission angle) 특이점 (크랭크∥링크),
     0° = 완전 신장 특이점 (J2·J3·손목 일직선). 양쪽 모두 운용 금지 */
env_fold_min = -75;   // 접힘 한계 (전동각 sin25° ≈ 0.42 이상 확보)
env_fold_max = -3;    // 신장 한계 (리치 ≈ 499.5mm — 공칭 500 대비 -0.5)

// J3 모터 후방 배치 연장 길이 (MEC-001c)
// J2 액추에이터는 J2 축 동축 직결 (MEC-001b) — 후방 배치 대상은 J3 어셈블리만
// J1 회전 시 베이스·작업물 간섭 확인 필수
rear_extension = 80;    // J2 피벗 → J3 모터+기어박스 어셈블리 중심 [잠정]

/* ===== 턴테이블 (turntable) — MEC-003 ===== */
turntable_bearing_gap = 30;   // 6810ZZ 2개 축방향 이격, 30mm 이상 (SHOULD)

/* ===== 모터 (motor) — CON-004: 산요덴키 SF24 시리즈 =====
   NEMA 17 호환 42각 */
motor_frame = 42;             // 프레임 폭 (mm)
nema17_hole_pitch = 31;       // 고정 볼트 피치
nema17_pilot_d = 22;          // 센터 파일럿 직경
nema17_bolt_d = 3;            // M3

/* ===== 감속비 (gear ratio) — CON-005: 5/10/20만 허용 ===== */
// 주의: MG17-G10(10:1)은 허용 토크 5N·m로 급락 — 변경 시 토크 재검증 (docs/torque-budget.md)
ratio_J1 = 20;
ratio_J2 = 20;
ratio_J3 = 20;   // SF2423 + 20:1 확정 (TBD-3 해결)
ratio_J4 = 5;

/* ===== 기어박스 (gearbox) — MG17 데이터시트 (docs/tbd-research.md TBD-5) ===== */
gbx_frame = 42;            // NEMA 17 플랜지, 모터와 동일 42각
gbx_len_20to1 = 51;        // MG17-G20 길이 (J1~J3)
gbx_len_5to1  = 40;        // MG17-G5 길이 (J4)
gbx_out_shaft_d = 8;       // 출력축 직경
gbx_in_insert = 9.5;       // 입력 결합 깊이 — SF24 축 길이 호환 확인 항목
gbx_mass_20to1 = 400;      // g — 질량 예산 계산용
gbx_mass_5to1  = 350;      // g

/* ===== 모터 몸체 치수 — SF24 카탈로그 일반값 [잠정: 구매 데이터시트로 확인] ===== */
motor_len_SF2424 = 47;    // J1, J2
motor_len_SF2423 = 39;    // J3
motor_len_SF2422 = 33;    // J4
motor_shaft_d = 5;        // SF24 출력축 (MG17 입력 클램프 ⌀5)
gbx_out_shaft_len = 20;   // MG17 출력축 돌출 길이

/* ===== 베이스/J1 (MEC-003, MEC-005) ===== */
base_plate_size = 140;    // 정사각 베이스 플레이트 한 변
base_plate_t = 8;
base_bolt_d = 5;          // M5 ×4 작업대 고정 (MEC-005)
base_bolt_pitch = 120;    // 고정 볼트 피치
base_col_wall = 5;        // 턴테이블 칼럼 벽 두께
col_window_w = 50;        // 칼럼 측면 배선/조립 창 폭
turntable_top_d = 100;    // 턴테이블 상판 직경
turntable_top_t = 8;
j1_actuator_gap = 4;      // 베이스 플레이트 상면 → 모터 하면 여유
col_open_h = 24;          // 모터 플로어 상면 → 하부 베어링 (스템 결합·셋스크류 존)
j1_stem_d = 20;           // 턴테이블 허브 스템(출력축 결합부) 외경
set_screw_pilot_d = 3.4;  // M4 무두 볼트(set screw) 셀프태핑 파일럿
m3_tap_d = 2.8;           // M3 셀프태핑 파일럿 (앵커 등 소형 체결)
shoulder_mount_px = 80;   // 어깨 텅 ↔ 턴테이블 볼트 피치 X
shoulder_mount_py = 50;   // 어깨 텅 ↔ 턴테이블 볼트 피치 Y
shoulder_mount_bolt_d = 5;// M5 ×4
shoulder_tongue_x = 40;   // 어깨 텅 깊이(X) — 포크 내 스윕 간섭 한계 결정 (J2 ≈ ±55°)

/* ===== 암 단면/관절 (MEC-004) — v0.13 플레이트 아키텍처 =====
   원칙: 출력물은 평판(plate)만. 간격은 표준 스페이서 튜브 + 관통 볼트가
   결정 (일체 보스·웹·박스 금지). 관절 베어링은 플레이트에 직접 압입 —
   플레이트 두께 = 608ZZ 폭(7) */
arm_plate_t = 7;          // 측판 두께 = 608ZZ 폭 (베어링 인-플레이트 압입)
fork_standoff_len = 30;   // 표준 육각 스탠드오프 길이 (어깨 포크 갭 = 하완 내폭)
hex_standoff_af = 13;     // 두꺼운 육각 스탠드오프 평면폭 (M6 암-암)
joint_spacer_od = 12;     // 관절 스택 스페이서 튜브 외경 (숄더 ⌀8 위)
ua_split_x = 115;         // 상완 플레이트 분할선 (365 > 빌드 대각 한계)
ua_splice = [99, 131];    // 스플라이스 더블러 볼트 X 위치 (분할선 ±16)
// 어깨 텅(플레이트 스택) 폭 = 플레이트 14 ×2 + 표준 스탠드오프 30 (v0.13)
tongue_w = 28 + fork_standoff_len;          // 58
// 상완 포크 내폭 = 표준 육각 스탠드오프 L60 (전 스탠드오프 표준화 — v0.14).
// 텅 58과의 편차 1mm/측은 J2 스택 M8 와셔가 흡수 (CON-001 와셔 기존 품목)
arm_inner_w = 60;
arm_h = 50;               // 암 단면 높이
j2_axis_h = 90;           // 턴테이블 상면 → J2 축 높이
                          // — J2 +45° 시 후방 러그 하단 ↔ 어깨 플랜지 간섭 회피 (간섭 검사 확인)
j3_crank_len = 40;        // J3 크랭크 = 하완 혼 반경 (평행사변형 1:1)
pl_offset = 45;           // 수동 평행사변형(MEC-002) 피벗 오프셋
                          // — J2 모터 42각 코너 스윕 반경(≈30) + 여유
forearm_inner_w = fork_standoff_len;  // 하완 측판 내폭 = 표준 스탠드오프 30 (v0.13)
beam_w = 40;              // 상완/하완 중앙 보(beam) 폭
arm_lug_r = 26;           // 관절 러그(피벗 보스) 반경 — NEMA17 볼트 코너(r≈21.9) + 벽
beam_wall = 4;            // 보 쉘 벽 두께 (경량화)
pivot_engage = 14;        // 축 클램프/베어링 물림 깊이
crank_t = 8;              // J3 크랭크 암 두께
crank_hub_d = 20;         // 크랭크 허브 외경
crank_hub_w = 12;         // 크랭크 허브 폭
dl_offset = 8;            // 구동 링크 평면: 플레이트 A 외면 → 링크 중심 거리
ua_joint_x = 95;          // 상완 분할 조인트 위치 (MFG-004: 365mm > 빌드 대각 한계)
ua_lap = 36;              // 랩 조인트(소켓-테논) 물림 길이

/* ===== 너트 평면폭 (across flats) ===== */
m3_nut_af = 5.5;
m4_nut_af = 7;
m6_nut_af = 10;
link_bar_w = 12;          // 링크 바 단면 폭
link_bar_t = 6;           // 링크 바 단면 두께
link_boss_d = 24;         // 링크 단부 625ZZ 보스 외경 (625 외경 16 + 벽 4×2)

/* ===== 손목/공구 플랜지 (GEN-004) ===== */
wrist_offset = 50;        // 손목 피치 피벗 → J4(플랜지) 축 수평 오프셋
                          // — J4 모터 몸체 ↔ 하완 러그 스윕 간섭 회피 (≥ lug_r + 모터 반폭)
forearm_len = L2 - wrist_offset; // 팔꿈치 축 → 손목 피치 피벗
wrist_wall = 5;           // 손목 하우징 벽 두께
flange_d = 45;            // 공구 플랜지 직경
flange_t = 8;
flange_bc = 32;           // 그리퍼 볼트 서클
flange_bolt_d = 4;        // M4 ×4

/* ===== 리미트 스위치 (ELE-004) — KW12형 기계식 마이크로 기준품 ===== */
ls_body = [20, 10, 6.5];  // 몸체 [길이, 높이, 두께]
ls_hole_pitch = 9.5;      // 장착 홀 피치
ls_hole_d = 2.3;          // M2 셀프태핑/볼트

/* ===== 질량 산출 (MEC-007, docs/mass-budget.md) ===== */
petgcf_density = 1.30;    // g/cm³ (PETG-CF 카탈로그 일반값)
print_solidity = 0.6;     // 쉘+인필 유효 충전율 [잠정 — 슬라이서 추정으로 대체]
motor_mass_SF2424 = 510;  // g (산요 카탈로그 확정)
motor_mass_SF2423 = 380;
motor_mass_SF2422 = 300;

/* ===== 질량/성능 예산 ===== */
payload = 1.0;            // kg, 그리퍼 포함 정격 (PER-001)
moving_mass_budget = 0.8; // kg, 상완 이후 이동부 상한 (MEC-007)

/* ===== 출력 제약 — MFG-004 (Creality SparkX i7, TBD-8 해결) ===== */
build_volume = [260, 260, 255];
// main file
// 상완 스플라이스 더블러 (×2매 출력, M4 ×4/매) — v0.13 평판
include <../config/parameters.scad>
use <upper_arm.scad>

upper_arm("doubler");
